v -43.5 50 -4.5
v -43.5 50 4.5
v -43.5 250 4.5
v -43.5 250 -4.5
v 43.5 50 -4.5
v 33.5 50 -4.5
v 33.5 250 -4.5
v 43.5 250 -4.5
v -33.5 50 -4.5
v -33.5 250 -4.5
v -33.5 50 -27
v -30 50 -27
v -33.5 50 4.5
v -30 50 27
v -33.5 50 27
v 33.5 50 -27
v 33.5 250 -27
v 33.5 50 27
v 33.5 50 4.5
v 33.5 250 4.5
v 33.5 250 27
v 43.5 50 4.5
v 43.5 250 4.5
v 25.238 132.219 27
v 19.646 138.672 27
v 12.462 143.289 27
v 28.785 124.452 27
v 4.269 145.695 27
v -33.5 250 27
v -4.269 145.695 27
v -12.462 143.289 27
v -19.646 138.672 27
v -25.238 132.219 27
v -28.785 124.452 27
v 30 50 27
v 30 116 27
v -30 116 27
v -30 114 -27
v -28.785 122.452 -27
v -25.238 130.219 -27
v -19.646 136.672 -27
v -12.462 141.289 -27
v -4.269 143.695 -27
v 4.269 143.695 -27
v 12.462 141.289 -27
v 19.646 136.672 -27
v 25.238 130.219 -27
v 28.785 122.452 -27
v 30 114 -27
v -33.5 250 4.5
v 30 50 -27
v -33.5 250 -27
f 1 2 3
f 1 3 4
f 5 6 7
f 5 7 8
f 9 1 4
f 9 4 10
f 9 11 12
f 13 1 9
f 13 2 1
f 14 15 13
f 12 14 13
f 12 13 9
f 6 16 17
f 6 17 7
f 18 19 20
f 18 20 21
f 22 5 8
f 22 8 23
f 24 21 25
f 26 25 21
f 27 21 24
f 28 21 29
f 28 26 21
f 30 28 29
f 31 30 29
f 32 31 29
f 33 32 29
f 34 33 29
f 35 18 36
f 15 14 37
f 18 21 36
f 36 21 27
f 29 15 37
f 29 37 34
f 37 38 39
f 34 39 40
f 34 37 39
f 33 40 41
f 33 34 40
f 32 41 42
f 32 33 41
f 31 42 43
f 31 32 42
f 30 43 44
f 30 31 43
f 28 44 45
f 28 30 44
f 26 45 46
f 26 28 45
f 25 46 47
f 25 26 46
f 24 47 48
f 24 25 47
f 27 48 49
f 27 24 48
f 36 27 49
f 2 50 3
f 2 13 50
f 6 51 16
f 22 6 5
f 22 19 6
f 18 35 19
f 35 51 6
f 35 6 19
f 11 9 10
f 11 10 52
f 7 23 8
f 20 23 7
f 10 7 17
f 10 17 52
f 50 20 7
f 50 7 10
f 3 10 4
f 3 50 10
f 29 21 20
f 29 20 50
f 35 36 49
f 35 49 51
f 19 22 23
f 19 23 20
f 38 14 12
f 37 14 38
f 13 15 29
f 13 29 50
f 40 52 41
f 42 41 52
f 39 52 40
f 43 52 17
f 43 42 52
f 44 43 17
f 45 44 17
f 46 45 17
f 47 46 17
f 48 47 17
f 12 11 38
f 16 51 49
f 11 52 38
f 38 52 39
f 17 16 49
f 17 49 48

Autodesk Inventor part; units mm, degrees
ref_plane "YZ Plane" through (0, 0, 0) normal (1, 0, 0) x (0, 1, 0)
ref_plane "XZ Plane" through (0, 0, 0) normal (0, 1, 0) x (-1, 0, 0)
ref_plane "XY Plane" through (0, 0, 0) normal (0, 0, 1) x (1, 0, 0)
sketch "草圖1" plane through (0, 0, 0) normal (0, 1, 0) x (-1, 0, 0)
  line L0 (-33.5, 27) -> (33.5, 27)
  line L1 (33.5, 27) -> (33.5, -27)
  line L2 (33.5, -27) -> (-33.5, -27)
  line L3 (-33.5, -27) -> (-33.5, 27)
  line L4 (-33.5, 27) -> (33.5, -27) construction
  line L5 (33.5, 27) -> (-33.5, -27) construction
  line L6 (43.5, -4.5) -> (33.5, -4.5)
  line L7 (33.5, -4.5) -> (33.5, 4.5)
  line L8 (33.5, 4.5) -> (43.5, 4.5)
  line L9 (43.5, 4.5) -> (43.5, -4.5)
  line L10 (-33.5, -4.5) -> (-43.5, -4.5)
  line L11 (-43.5, -4.5) -> (-43.5, 4.5)
  line L12 (-43.5, 4.5) -> (-33.5, 4.5)
  line L13 (-33.5, 4.5) -> (-33.5, -4.5)
  point P0 (0, 0)
  point P1 (33.5, 0)
  point P2 (-33.5, 0)
  point P3 (-33.5, 4.5)
  point P4 (-33.5, -4.5)
  dimension "d0" = 67
  dimension "d1" = 54
  dimension "d2" = 9
  dimension "d3" = 10
extrude "擠出1" add sketch "草圖1" along normal blind 250
sketch "草圖2" plane through (-33.5, 0, 27) normal (0, 0, 1) x (1, 0, 0)
  circle A0 centre (33.5, 102) radius 30
  line L0 (0, 0) -> (67, 0) projected
  line L1 (3.5, 102) -> (63.5, 102)
  line L2 (63.5, 102) -> (63.5, -30.9469)
  line L3 (63.5, -30.9469) -> (3.5, -30.9469)
  line L4 (3.5, -30.9469) -> (3.5, 102)
  point P0 (33.5, 0)
  point P1 (33.5, 0)
  point P2 (63.5, 102)
  dimension "d6" = 102
  dimension "d7" = 60
extrude "擠出2" cut sketch "草圖2" against normal through all
sketch "草圖3" plane through (-33.5, 250, 27) normal (0, 0, 1) x (1, 0, 0)
  line L0 (-69.9684, -200) -> (136.9684, -200)
  line L1 (136.9684, -200) -> (136.9684, -250)
  line L2 (136.9684, -250) -> (-69.9684, -250)
  line L3 (-69.9684, -250) -> (-69.9684, -200)
  point P0 (33.5, -250)
  point P1 (33.5, -250)
  dimension "d10" = 50
extrude "擠出3" cut sketch "草圖3" against normal through all
sketch "草圖4" plane through (33.5, 250, -27) normal (0, 0, -1) x (-1, 0, 0)
  arc A0 (63.5, -148) -> (3.5, -148) centre (33.5, -148) ccw construction
  circle A1 centre (33.5, -136) radius 30
  line L0 (63.5, -200) -> (3.5, -200)
  line L1 (3.5, -200) -> (3.5, -136)
  line L2 (3.5, -136) -> (63.5, -136)
  line L3 (63.5, -136) -> (63.5, -200)
  point P0 (33.5, -250)
  point P1 (63.5, -200)
  dimension "d13" = 12
  dimension "d14" = 60
sketch "草圖5" plane through (-33.5, 250, 27) normal (0, 0, 1) x (1, 0, 0)
  circle A0 centre (33.5, -134) radius 30
  arc A1 (63.5, -148) -> (3.5, -148) centre (33.5, -148) ccw construction
  line L0 (63.5, -200) -> (3.5, -200)
  line L1 (3.5, -200) -> (3.5, -134)
  line L2 (3.5, -134) -> (63.5, -134)
  line L3 (63.5, -134) -> (63.5, -200)
  point P0 (33.5, -250)
  dimension "d15" = 14
  dimension "d16" = 60
loft "斷面混成1" cut profiles "草圖4", "草圖5"
properties part number "Slider-4"
